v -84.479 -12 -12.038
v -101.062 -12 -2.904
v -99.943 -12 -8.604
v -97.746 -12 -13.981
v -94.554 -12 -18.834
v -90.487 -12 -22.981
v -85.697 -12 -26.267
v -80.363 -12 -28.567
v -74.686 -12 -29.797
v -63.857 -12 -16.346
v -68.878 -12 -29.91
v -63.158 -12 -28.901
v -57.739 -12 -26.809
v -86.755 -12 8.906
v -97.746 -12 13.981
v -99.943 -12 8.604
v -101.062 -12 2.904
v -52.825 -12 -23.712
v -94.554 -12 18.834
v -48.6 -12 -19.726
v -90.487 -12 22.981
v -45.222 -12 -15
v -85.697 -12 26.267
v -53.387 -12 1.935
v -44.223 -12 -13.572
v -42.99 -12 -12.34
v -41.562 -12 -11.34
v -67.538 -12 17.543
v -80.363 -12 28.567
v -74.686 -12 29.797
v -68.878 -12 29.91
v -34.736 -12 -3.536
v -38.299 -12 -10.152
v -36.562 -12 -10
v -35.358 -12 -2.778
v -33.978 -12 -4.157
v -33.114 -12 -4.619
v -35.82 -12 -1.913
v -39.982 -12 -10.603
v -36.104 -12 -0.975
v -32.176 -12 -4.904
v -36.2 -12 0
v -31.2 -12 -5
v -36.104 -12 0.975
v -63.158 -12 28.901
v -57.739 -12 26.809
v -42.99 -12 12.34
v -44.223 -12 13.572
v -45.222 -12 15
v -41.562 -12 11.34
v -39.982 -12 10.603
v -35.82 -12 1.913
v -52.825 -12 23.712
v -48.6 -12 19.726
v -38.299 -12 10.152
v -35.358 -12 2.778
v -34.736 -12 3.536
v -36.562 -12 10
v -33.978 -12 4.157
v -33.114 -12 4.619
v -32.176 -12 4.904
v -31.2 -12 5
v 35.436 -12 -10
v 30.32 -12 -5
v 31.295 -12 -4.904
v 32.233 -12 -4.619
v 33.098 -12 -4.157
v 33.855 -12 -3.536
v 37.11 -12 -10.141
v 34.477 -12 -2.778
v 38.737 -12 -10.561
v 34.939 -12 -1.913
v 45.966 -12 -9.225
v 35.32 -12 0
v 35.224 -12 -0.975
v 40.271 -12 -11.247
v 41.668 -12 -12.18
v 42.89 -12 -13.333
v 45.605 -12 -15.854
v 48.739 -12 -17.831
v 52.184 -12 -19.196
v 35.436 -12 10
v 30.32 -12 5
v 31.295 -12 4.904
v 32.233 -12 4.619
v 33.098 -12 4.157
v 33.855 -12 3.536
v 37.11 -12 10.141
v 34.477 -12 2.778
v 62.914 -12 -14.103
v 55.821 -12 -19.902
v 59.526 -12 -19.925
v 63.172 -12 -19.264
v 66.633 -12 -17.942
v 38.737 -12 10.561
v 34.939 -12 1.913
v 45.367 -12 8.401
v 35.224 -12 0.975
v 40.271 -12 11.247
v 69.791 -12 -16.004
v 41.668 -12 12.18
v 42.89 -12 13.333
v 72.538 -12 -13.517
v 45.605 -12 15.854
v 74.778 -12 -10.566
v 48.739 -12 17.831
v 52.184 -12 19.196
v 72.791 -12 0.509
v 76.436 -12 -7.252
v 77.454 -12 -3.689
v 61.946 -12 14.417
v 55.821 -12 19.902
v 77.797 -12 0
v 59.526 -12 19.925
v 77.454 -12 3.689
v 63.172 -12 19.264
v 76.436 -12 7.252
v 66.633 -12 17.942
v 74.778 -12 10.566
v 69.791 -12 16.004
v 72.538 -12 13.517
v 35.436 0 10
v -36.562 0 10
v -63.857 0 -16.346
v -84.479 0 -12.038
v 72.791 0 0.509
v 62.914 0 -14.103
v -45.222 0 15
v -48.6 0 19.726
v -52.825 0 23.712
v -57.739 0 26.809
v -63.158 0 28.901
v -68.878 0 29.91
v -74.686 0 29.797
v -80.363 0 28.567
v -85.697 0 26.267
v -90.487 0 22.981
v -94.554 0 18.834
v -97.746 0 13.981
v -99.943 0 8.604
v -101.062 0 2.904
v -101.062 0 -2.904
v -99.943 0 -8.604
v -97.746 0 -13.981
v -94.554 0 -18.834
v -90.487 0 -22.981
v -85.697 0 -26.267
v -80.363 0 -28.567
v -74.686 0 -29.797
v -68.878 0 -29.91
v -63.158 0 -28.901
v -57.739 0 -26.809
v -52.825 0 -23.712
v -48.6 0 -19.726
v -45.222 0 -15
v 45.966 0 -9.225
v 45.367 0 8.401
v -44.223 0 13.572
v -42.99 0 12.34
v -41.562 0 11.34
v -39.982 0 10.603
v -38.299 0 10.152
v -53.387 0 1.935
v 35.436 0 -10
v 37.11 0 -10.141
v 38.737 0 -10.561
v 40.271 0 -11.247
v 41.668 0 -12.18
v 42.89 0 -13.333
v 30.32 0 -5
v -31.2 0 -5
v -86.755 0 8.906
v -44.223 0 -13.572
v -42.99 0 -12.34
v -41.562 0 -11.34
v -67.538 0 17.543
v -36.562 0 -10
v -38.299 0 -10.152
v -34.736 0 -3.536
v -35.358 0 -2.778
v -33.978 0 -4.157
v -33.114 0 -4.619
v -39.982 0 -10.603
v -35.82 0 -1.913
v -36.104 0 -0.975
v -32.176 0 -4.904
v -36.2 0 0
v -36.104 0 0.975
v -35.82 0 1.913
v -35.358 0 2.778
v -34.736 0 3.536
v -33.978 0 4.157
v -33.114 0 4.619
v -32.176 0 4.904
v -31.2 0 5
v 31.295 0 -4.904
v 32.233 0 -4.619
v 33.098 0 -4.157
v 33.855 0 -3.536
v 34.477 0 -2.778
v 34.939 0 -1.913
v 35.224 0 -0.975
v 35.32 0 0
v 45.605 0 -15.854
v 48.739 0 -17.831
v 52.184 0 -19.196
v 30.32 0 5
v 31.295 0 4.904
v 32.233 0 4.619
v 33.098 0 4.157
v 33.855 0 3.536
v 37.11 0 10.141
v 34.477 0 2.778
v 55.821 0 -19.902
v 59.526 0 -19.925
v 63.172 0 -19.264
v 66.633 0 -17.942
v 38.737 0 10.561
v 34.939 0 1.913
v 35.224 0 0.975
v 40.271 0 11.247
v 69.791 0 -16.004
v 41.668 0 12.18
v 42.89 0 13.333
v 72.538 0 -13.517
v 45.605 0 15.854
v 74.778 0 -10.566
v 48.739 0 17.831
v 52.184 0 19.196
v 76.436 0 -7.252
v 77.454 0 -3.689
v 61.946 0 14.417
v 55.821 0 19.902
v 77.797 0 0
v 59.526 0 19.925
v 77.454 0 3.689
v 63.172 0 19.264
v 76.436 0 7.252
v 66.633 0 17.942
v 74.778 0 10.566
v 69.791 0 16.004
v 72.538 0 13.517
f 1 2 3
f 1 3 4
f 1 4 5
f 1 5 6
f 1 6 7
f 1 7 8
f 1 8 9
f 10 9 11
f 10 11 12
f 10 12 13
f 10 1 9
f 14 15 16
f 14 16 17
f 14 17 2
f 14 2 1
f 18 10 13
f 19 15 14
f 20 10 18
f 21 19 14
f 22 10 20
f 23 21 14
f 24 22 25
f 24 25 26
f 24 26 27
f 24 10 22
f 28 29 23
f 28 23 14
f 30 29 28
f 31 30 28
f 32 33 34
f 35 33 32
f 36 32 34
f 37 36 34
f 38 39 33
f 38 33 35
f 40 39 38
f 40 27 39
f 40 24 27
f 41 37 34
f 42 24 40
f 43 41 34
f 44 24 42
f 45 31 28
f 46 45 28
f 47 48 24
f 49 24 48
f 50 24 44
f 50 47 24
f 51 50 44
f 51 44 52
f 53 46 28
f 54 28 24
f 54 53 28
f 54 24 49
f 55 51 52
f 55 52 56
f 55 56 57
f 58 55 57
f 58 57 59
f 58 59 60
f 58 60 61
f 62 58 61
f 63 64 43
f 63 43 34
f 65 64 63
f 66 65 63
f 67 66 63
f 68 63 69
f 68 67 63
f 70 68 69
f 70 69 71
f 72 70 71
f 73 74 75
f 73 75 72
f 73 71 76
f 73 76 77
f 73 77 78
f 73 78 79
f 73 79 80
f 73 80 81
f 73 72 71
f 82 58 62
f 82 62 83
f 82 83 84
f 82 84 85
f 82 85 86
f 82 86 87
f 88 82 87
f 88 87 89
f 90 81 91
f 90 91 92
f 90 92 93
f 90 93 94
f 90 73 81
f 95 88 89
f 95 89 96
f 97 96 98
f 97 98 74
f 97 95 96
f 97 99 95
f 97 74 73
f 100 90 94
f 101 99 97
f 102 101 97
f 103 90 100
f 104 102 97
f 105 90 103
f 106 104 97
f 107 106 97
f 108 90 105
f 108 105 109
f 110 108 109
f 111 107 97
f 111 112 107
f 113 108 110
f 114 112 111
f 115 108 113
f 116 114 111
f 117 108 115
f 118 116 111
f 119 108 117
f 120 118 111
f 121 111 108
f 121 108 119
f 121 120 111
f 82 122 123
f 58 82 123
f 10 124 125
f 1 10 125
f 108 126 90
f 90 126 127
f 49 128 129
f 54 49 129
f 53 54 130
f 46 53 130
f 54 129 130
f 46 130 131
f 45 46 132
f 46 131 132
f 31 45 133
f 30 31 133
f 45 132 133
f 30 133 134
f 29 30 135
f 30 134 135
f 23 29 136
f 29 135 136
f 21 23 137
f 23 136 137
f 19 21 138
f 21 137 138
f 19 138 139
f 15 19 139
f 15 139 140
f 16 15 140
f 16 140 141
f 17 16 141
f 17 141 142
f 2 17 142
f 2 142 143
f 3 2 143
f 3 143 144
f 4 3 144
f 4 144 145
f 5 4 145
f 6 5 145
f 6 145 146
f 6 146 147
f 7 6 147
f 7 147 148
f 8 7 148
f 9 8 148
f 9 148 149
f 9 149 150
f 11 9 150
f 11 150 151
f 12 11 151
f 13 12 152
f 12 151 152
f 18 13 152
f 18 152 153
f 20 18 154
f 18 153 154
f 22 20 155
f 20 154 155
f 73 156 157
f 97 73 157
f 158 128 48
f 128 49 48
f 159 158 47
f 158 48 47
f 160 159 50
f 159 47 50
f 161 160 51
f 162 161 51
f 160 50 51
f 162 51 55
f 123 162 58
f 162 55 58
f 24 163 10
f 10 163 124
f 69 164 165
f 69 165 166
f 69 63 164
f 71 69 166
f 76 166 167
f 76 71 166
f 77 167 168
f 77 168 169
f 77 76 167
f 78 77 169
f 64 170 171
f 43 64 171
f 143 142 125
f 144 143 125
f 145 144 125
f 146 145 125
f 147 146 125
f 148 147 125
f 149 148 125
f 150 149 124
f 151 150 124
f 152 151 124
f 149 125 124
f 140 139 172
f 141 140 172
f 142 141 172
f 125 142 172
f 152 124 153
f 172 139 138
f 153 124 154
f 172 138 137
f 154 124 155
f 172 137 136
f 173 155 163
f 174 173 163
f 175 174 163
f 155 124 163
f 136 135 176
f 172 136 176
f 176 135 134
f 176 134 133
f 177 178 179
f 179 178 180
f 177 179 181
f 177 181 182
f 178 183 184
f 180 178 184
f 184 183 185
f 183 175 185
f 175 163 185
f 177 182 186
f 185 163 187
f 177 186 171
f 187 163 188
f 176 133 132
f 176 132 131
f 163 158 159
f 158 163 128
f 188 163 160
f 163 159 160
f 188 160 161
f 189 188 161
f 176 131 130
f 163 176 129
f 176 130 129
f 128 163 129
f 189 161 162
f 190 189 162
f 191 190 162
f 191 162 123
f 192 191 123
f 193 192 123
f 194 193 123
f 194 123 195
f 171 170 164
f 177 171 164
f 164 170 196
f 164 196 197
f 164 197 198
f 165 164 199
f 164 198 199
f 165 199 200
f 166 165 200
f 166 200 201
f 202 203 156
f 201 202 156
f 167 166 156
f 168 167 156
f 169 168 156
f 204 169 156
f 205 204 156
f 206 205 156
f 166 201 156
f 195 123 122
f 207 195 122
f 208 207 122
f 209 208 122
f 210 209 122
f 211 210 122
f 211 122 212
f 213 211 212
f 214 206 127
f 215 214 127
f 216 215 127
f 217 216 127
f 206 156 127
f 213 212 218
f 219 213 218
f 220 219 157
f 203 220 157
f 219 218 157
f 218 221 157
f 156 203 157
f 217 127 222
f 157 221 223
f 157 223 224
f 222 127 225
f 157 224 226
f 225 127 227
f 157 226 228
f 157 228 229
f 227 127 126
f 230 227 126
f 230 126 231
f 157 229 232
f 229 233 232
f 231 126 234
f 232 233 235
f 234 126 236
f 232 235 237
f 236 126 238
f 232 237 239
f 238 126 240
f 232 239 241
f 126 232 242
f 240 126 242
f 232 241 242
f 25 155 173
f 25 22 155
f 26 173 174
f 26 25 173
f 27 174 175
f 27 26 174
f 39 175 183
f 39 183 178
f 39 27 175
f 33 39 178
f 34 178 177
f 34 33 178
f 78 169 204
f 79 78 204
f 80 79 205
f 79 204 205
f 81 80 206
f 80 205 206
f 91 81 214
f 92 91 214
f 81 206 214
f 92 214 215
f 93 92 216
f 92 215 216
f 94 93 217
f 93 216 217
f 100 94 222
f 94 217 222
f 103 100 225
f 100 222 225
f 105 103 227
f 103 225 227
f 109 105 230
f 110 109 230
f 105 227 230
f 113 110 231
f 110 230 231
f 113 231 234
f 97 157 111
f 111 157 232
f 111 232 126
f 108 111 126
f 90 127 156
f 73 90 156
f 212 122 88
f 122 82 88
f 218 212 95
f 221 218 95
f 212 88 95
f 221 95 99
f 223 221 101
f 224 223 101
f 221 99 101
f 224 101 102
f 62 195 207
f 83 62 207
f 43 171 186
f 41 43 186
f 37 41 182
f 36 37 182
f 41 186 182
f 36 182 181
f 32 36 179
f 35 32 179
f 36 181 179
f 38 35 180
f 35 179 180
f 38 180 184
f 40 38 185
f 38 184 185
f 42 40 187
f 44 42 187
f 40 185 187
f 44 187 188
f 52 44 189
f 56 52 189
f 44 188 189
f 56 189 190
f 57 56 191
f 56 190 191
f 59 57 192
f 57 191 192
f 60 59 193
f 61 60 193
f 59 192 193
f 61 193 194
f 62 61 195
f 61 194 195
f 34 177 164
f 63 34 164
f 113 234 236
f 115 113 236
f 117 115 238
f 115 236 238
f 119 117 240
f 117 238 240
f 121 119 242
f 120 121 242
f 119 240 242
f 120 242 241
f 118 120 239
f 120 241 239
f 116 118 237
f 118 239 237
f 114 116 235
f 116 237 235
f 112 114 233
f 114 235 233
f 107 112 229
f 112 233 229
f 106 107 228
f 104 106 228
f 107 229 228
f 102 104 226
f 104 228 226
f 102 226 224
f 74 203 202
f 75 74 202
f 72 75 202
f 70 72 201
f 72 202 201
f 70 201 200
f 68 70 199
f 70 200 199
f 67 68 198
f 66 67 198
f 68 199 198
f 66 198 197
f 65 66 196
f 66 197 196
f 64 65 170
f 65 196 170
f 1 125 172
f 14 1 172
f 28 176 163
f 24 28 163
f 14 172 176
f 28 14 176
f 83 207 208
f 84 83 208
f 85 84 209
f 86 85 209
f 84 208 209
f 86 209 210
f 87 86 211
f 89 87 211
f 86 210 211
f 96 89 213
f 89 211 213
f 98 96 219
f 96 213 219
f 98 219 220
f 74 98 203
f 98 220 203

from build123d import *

# Parameters (mm, degrees)
F1_DEPTH = 12
F2_R     = 10


with BuildPart() as f1:
    # F0 (on Front) → F1 (new body)
    with BuildSketch(Plane.XZ):
        with BuildLine():
            Line((-42.918921, -10), (-42.918921, 10))
            ThreePointArc((-42.918921, 10), (-101.203192, 0), (-42.918921, -10))
        make_face()
        Polygon((-86.754676, 8.906493), (-67.538286, 17.542597), (-53.386672, 1.935428), (-63.856883, -16.346437), (-84.479443, -12.038082), align=None, mode=Mode.SUBTRACT)
        with BuildLine():
            Line((40.4763, 10), (-42.918921, 10))
            ThreePointArc((-42.918921, 10), (-41.635235, 5.073059), (-41.203192, 0))
            ThreePointArc((-41.203192, 0), (-41.635235, -5.073059), (-42.918921, -10))
            Line((-42.918921, -10), (40.4763, -10))
            ThreePointArc((40.4763, -10), (37.796808, 0), (40.4763, 10))
        make_face()
        with BuildLine():
            ThreePointArc((-31.200418, -5), (-36.200418, 0), (-31.200418, 5))
            Line((-31.200418, 5), (30.31986, 5))
            ThreePointArc((30.31986, 5), (33.855394, 3.535534), (35.31986, 0))
            ThreePointArc((35.31986, 0), (33.855394, -3.535534), (30.31986, -5))
            Line((30.31986, -5), (-31.200418, -5))
        make_face(mode=Mode.SUBTRACT)
        with BuildLine():
            ThreePointArc((-41.203192, 0), (-41.635235, 5.073059), (-42.918921, 10))
            Line((-42.918921, 10), (-42.918921, -10))
            ThreePointArc((-42.918921, -10), (-41.635235, -5.073059), (-41.203192, 0))
        make_face()
        with BuildLine():
            Line((40.4763, -10), (40.4763, 10))
            ThreePointArc((40.4763, 10), (37.796808, 0), (40.4763, -10))
        make_face()
        with BuildLine():
            ThreePointArc((77.796808, 0), (62.973189, 19.318517), (40.4763, 10))
            Line((40.4763, 10), (40.4763, -10))
            ThreePointArc((40.4763, -10), (62.973189, -19.318517), (77.796808, 0))
        make_face()
        Polygon((45.367177, 8.401368), (61.946016, 14.417447), (72.79079, 0.509104), (62.91439, -14.102803), (45.965665, -9.225116), align=None, mode=Mode.SUBTRACT)
    extrude(amount=F1_DEPTH)

    # F2
    f2_edges = [f1.edges().sort_by_distance(p)[0] for p in [
        (-42.918921, -6, -10),
        (40.4763, -6, -10),
        (40.4763, -6, 10),
        (-42.918921, -6, 10),
    ]]
    fillet(f2_edges, radius=F2_R)


solid = f1.part
